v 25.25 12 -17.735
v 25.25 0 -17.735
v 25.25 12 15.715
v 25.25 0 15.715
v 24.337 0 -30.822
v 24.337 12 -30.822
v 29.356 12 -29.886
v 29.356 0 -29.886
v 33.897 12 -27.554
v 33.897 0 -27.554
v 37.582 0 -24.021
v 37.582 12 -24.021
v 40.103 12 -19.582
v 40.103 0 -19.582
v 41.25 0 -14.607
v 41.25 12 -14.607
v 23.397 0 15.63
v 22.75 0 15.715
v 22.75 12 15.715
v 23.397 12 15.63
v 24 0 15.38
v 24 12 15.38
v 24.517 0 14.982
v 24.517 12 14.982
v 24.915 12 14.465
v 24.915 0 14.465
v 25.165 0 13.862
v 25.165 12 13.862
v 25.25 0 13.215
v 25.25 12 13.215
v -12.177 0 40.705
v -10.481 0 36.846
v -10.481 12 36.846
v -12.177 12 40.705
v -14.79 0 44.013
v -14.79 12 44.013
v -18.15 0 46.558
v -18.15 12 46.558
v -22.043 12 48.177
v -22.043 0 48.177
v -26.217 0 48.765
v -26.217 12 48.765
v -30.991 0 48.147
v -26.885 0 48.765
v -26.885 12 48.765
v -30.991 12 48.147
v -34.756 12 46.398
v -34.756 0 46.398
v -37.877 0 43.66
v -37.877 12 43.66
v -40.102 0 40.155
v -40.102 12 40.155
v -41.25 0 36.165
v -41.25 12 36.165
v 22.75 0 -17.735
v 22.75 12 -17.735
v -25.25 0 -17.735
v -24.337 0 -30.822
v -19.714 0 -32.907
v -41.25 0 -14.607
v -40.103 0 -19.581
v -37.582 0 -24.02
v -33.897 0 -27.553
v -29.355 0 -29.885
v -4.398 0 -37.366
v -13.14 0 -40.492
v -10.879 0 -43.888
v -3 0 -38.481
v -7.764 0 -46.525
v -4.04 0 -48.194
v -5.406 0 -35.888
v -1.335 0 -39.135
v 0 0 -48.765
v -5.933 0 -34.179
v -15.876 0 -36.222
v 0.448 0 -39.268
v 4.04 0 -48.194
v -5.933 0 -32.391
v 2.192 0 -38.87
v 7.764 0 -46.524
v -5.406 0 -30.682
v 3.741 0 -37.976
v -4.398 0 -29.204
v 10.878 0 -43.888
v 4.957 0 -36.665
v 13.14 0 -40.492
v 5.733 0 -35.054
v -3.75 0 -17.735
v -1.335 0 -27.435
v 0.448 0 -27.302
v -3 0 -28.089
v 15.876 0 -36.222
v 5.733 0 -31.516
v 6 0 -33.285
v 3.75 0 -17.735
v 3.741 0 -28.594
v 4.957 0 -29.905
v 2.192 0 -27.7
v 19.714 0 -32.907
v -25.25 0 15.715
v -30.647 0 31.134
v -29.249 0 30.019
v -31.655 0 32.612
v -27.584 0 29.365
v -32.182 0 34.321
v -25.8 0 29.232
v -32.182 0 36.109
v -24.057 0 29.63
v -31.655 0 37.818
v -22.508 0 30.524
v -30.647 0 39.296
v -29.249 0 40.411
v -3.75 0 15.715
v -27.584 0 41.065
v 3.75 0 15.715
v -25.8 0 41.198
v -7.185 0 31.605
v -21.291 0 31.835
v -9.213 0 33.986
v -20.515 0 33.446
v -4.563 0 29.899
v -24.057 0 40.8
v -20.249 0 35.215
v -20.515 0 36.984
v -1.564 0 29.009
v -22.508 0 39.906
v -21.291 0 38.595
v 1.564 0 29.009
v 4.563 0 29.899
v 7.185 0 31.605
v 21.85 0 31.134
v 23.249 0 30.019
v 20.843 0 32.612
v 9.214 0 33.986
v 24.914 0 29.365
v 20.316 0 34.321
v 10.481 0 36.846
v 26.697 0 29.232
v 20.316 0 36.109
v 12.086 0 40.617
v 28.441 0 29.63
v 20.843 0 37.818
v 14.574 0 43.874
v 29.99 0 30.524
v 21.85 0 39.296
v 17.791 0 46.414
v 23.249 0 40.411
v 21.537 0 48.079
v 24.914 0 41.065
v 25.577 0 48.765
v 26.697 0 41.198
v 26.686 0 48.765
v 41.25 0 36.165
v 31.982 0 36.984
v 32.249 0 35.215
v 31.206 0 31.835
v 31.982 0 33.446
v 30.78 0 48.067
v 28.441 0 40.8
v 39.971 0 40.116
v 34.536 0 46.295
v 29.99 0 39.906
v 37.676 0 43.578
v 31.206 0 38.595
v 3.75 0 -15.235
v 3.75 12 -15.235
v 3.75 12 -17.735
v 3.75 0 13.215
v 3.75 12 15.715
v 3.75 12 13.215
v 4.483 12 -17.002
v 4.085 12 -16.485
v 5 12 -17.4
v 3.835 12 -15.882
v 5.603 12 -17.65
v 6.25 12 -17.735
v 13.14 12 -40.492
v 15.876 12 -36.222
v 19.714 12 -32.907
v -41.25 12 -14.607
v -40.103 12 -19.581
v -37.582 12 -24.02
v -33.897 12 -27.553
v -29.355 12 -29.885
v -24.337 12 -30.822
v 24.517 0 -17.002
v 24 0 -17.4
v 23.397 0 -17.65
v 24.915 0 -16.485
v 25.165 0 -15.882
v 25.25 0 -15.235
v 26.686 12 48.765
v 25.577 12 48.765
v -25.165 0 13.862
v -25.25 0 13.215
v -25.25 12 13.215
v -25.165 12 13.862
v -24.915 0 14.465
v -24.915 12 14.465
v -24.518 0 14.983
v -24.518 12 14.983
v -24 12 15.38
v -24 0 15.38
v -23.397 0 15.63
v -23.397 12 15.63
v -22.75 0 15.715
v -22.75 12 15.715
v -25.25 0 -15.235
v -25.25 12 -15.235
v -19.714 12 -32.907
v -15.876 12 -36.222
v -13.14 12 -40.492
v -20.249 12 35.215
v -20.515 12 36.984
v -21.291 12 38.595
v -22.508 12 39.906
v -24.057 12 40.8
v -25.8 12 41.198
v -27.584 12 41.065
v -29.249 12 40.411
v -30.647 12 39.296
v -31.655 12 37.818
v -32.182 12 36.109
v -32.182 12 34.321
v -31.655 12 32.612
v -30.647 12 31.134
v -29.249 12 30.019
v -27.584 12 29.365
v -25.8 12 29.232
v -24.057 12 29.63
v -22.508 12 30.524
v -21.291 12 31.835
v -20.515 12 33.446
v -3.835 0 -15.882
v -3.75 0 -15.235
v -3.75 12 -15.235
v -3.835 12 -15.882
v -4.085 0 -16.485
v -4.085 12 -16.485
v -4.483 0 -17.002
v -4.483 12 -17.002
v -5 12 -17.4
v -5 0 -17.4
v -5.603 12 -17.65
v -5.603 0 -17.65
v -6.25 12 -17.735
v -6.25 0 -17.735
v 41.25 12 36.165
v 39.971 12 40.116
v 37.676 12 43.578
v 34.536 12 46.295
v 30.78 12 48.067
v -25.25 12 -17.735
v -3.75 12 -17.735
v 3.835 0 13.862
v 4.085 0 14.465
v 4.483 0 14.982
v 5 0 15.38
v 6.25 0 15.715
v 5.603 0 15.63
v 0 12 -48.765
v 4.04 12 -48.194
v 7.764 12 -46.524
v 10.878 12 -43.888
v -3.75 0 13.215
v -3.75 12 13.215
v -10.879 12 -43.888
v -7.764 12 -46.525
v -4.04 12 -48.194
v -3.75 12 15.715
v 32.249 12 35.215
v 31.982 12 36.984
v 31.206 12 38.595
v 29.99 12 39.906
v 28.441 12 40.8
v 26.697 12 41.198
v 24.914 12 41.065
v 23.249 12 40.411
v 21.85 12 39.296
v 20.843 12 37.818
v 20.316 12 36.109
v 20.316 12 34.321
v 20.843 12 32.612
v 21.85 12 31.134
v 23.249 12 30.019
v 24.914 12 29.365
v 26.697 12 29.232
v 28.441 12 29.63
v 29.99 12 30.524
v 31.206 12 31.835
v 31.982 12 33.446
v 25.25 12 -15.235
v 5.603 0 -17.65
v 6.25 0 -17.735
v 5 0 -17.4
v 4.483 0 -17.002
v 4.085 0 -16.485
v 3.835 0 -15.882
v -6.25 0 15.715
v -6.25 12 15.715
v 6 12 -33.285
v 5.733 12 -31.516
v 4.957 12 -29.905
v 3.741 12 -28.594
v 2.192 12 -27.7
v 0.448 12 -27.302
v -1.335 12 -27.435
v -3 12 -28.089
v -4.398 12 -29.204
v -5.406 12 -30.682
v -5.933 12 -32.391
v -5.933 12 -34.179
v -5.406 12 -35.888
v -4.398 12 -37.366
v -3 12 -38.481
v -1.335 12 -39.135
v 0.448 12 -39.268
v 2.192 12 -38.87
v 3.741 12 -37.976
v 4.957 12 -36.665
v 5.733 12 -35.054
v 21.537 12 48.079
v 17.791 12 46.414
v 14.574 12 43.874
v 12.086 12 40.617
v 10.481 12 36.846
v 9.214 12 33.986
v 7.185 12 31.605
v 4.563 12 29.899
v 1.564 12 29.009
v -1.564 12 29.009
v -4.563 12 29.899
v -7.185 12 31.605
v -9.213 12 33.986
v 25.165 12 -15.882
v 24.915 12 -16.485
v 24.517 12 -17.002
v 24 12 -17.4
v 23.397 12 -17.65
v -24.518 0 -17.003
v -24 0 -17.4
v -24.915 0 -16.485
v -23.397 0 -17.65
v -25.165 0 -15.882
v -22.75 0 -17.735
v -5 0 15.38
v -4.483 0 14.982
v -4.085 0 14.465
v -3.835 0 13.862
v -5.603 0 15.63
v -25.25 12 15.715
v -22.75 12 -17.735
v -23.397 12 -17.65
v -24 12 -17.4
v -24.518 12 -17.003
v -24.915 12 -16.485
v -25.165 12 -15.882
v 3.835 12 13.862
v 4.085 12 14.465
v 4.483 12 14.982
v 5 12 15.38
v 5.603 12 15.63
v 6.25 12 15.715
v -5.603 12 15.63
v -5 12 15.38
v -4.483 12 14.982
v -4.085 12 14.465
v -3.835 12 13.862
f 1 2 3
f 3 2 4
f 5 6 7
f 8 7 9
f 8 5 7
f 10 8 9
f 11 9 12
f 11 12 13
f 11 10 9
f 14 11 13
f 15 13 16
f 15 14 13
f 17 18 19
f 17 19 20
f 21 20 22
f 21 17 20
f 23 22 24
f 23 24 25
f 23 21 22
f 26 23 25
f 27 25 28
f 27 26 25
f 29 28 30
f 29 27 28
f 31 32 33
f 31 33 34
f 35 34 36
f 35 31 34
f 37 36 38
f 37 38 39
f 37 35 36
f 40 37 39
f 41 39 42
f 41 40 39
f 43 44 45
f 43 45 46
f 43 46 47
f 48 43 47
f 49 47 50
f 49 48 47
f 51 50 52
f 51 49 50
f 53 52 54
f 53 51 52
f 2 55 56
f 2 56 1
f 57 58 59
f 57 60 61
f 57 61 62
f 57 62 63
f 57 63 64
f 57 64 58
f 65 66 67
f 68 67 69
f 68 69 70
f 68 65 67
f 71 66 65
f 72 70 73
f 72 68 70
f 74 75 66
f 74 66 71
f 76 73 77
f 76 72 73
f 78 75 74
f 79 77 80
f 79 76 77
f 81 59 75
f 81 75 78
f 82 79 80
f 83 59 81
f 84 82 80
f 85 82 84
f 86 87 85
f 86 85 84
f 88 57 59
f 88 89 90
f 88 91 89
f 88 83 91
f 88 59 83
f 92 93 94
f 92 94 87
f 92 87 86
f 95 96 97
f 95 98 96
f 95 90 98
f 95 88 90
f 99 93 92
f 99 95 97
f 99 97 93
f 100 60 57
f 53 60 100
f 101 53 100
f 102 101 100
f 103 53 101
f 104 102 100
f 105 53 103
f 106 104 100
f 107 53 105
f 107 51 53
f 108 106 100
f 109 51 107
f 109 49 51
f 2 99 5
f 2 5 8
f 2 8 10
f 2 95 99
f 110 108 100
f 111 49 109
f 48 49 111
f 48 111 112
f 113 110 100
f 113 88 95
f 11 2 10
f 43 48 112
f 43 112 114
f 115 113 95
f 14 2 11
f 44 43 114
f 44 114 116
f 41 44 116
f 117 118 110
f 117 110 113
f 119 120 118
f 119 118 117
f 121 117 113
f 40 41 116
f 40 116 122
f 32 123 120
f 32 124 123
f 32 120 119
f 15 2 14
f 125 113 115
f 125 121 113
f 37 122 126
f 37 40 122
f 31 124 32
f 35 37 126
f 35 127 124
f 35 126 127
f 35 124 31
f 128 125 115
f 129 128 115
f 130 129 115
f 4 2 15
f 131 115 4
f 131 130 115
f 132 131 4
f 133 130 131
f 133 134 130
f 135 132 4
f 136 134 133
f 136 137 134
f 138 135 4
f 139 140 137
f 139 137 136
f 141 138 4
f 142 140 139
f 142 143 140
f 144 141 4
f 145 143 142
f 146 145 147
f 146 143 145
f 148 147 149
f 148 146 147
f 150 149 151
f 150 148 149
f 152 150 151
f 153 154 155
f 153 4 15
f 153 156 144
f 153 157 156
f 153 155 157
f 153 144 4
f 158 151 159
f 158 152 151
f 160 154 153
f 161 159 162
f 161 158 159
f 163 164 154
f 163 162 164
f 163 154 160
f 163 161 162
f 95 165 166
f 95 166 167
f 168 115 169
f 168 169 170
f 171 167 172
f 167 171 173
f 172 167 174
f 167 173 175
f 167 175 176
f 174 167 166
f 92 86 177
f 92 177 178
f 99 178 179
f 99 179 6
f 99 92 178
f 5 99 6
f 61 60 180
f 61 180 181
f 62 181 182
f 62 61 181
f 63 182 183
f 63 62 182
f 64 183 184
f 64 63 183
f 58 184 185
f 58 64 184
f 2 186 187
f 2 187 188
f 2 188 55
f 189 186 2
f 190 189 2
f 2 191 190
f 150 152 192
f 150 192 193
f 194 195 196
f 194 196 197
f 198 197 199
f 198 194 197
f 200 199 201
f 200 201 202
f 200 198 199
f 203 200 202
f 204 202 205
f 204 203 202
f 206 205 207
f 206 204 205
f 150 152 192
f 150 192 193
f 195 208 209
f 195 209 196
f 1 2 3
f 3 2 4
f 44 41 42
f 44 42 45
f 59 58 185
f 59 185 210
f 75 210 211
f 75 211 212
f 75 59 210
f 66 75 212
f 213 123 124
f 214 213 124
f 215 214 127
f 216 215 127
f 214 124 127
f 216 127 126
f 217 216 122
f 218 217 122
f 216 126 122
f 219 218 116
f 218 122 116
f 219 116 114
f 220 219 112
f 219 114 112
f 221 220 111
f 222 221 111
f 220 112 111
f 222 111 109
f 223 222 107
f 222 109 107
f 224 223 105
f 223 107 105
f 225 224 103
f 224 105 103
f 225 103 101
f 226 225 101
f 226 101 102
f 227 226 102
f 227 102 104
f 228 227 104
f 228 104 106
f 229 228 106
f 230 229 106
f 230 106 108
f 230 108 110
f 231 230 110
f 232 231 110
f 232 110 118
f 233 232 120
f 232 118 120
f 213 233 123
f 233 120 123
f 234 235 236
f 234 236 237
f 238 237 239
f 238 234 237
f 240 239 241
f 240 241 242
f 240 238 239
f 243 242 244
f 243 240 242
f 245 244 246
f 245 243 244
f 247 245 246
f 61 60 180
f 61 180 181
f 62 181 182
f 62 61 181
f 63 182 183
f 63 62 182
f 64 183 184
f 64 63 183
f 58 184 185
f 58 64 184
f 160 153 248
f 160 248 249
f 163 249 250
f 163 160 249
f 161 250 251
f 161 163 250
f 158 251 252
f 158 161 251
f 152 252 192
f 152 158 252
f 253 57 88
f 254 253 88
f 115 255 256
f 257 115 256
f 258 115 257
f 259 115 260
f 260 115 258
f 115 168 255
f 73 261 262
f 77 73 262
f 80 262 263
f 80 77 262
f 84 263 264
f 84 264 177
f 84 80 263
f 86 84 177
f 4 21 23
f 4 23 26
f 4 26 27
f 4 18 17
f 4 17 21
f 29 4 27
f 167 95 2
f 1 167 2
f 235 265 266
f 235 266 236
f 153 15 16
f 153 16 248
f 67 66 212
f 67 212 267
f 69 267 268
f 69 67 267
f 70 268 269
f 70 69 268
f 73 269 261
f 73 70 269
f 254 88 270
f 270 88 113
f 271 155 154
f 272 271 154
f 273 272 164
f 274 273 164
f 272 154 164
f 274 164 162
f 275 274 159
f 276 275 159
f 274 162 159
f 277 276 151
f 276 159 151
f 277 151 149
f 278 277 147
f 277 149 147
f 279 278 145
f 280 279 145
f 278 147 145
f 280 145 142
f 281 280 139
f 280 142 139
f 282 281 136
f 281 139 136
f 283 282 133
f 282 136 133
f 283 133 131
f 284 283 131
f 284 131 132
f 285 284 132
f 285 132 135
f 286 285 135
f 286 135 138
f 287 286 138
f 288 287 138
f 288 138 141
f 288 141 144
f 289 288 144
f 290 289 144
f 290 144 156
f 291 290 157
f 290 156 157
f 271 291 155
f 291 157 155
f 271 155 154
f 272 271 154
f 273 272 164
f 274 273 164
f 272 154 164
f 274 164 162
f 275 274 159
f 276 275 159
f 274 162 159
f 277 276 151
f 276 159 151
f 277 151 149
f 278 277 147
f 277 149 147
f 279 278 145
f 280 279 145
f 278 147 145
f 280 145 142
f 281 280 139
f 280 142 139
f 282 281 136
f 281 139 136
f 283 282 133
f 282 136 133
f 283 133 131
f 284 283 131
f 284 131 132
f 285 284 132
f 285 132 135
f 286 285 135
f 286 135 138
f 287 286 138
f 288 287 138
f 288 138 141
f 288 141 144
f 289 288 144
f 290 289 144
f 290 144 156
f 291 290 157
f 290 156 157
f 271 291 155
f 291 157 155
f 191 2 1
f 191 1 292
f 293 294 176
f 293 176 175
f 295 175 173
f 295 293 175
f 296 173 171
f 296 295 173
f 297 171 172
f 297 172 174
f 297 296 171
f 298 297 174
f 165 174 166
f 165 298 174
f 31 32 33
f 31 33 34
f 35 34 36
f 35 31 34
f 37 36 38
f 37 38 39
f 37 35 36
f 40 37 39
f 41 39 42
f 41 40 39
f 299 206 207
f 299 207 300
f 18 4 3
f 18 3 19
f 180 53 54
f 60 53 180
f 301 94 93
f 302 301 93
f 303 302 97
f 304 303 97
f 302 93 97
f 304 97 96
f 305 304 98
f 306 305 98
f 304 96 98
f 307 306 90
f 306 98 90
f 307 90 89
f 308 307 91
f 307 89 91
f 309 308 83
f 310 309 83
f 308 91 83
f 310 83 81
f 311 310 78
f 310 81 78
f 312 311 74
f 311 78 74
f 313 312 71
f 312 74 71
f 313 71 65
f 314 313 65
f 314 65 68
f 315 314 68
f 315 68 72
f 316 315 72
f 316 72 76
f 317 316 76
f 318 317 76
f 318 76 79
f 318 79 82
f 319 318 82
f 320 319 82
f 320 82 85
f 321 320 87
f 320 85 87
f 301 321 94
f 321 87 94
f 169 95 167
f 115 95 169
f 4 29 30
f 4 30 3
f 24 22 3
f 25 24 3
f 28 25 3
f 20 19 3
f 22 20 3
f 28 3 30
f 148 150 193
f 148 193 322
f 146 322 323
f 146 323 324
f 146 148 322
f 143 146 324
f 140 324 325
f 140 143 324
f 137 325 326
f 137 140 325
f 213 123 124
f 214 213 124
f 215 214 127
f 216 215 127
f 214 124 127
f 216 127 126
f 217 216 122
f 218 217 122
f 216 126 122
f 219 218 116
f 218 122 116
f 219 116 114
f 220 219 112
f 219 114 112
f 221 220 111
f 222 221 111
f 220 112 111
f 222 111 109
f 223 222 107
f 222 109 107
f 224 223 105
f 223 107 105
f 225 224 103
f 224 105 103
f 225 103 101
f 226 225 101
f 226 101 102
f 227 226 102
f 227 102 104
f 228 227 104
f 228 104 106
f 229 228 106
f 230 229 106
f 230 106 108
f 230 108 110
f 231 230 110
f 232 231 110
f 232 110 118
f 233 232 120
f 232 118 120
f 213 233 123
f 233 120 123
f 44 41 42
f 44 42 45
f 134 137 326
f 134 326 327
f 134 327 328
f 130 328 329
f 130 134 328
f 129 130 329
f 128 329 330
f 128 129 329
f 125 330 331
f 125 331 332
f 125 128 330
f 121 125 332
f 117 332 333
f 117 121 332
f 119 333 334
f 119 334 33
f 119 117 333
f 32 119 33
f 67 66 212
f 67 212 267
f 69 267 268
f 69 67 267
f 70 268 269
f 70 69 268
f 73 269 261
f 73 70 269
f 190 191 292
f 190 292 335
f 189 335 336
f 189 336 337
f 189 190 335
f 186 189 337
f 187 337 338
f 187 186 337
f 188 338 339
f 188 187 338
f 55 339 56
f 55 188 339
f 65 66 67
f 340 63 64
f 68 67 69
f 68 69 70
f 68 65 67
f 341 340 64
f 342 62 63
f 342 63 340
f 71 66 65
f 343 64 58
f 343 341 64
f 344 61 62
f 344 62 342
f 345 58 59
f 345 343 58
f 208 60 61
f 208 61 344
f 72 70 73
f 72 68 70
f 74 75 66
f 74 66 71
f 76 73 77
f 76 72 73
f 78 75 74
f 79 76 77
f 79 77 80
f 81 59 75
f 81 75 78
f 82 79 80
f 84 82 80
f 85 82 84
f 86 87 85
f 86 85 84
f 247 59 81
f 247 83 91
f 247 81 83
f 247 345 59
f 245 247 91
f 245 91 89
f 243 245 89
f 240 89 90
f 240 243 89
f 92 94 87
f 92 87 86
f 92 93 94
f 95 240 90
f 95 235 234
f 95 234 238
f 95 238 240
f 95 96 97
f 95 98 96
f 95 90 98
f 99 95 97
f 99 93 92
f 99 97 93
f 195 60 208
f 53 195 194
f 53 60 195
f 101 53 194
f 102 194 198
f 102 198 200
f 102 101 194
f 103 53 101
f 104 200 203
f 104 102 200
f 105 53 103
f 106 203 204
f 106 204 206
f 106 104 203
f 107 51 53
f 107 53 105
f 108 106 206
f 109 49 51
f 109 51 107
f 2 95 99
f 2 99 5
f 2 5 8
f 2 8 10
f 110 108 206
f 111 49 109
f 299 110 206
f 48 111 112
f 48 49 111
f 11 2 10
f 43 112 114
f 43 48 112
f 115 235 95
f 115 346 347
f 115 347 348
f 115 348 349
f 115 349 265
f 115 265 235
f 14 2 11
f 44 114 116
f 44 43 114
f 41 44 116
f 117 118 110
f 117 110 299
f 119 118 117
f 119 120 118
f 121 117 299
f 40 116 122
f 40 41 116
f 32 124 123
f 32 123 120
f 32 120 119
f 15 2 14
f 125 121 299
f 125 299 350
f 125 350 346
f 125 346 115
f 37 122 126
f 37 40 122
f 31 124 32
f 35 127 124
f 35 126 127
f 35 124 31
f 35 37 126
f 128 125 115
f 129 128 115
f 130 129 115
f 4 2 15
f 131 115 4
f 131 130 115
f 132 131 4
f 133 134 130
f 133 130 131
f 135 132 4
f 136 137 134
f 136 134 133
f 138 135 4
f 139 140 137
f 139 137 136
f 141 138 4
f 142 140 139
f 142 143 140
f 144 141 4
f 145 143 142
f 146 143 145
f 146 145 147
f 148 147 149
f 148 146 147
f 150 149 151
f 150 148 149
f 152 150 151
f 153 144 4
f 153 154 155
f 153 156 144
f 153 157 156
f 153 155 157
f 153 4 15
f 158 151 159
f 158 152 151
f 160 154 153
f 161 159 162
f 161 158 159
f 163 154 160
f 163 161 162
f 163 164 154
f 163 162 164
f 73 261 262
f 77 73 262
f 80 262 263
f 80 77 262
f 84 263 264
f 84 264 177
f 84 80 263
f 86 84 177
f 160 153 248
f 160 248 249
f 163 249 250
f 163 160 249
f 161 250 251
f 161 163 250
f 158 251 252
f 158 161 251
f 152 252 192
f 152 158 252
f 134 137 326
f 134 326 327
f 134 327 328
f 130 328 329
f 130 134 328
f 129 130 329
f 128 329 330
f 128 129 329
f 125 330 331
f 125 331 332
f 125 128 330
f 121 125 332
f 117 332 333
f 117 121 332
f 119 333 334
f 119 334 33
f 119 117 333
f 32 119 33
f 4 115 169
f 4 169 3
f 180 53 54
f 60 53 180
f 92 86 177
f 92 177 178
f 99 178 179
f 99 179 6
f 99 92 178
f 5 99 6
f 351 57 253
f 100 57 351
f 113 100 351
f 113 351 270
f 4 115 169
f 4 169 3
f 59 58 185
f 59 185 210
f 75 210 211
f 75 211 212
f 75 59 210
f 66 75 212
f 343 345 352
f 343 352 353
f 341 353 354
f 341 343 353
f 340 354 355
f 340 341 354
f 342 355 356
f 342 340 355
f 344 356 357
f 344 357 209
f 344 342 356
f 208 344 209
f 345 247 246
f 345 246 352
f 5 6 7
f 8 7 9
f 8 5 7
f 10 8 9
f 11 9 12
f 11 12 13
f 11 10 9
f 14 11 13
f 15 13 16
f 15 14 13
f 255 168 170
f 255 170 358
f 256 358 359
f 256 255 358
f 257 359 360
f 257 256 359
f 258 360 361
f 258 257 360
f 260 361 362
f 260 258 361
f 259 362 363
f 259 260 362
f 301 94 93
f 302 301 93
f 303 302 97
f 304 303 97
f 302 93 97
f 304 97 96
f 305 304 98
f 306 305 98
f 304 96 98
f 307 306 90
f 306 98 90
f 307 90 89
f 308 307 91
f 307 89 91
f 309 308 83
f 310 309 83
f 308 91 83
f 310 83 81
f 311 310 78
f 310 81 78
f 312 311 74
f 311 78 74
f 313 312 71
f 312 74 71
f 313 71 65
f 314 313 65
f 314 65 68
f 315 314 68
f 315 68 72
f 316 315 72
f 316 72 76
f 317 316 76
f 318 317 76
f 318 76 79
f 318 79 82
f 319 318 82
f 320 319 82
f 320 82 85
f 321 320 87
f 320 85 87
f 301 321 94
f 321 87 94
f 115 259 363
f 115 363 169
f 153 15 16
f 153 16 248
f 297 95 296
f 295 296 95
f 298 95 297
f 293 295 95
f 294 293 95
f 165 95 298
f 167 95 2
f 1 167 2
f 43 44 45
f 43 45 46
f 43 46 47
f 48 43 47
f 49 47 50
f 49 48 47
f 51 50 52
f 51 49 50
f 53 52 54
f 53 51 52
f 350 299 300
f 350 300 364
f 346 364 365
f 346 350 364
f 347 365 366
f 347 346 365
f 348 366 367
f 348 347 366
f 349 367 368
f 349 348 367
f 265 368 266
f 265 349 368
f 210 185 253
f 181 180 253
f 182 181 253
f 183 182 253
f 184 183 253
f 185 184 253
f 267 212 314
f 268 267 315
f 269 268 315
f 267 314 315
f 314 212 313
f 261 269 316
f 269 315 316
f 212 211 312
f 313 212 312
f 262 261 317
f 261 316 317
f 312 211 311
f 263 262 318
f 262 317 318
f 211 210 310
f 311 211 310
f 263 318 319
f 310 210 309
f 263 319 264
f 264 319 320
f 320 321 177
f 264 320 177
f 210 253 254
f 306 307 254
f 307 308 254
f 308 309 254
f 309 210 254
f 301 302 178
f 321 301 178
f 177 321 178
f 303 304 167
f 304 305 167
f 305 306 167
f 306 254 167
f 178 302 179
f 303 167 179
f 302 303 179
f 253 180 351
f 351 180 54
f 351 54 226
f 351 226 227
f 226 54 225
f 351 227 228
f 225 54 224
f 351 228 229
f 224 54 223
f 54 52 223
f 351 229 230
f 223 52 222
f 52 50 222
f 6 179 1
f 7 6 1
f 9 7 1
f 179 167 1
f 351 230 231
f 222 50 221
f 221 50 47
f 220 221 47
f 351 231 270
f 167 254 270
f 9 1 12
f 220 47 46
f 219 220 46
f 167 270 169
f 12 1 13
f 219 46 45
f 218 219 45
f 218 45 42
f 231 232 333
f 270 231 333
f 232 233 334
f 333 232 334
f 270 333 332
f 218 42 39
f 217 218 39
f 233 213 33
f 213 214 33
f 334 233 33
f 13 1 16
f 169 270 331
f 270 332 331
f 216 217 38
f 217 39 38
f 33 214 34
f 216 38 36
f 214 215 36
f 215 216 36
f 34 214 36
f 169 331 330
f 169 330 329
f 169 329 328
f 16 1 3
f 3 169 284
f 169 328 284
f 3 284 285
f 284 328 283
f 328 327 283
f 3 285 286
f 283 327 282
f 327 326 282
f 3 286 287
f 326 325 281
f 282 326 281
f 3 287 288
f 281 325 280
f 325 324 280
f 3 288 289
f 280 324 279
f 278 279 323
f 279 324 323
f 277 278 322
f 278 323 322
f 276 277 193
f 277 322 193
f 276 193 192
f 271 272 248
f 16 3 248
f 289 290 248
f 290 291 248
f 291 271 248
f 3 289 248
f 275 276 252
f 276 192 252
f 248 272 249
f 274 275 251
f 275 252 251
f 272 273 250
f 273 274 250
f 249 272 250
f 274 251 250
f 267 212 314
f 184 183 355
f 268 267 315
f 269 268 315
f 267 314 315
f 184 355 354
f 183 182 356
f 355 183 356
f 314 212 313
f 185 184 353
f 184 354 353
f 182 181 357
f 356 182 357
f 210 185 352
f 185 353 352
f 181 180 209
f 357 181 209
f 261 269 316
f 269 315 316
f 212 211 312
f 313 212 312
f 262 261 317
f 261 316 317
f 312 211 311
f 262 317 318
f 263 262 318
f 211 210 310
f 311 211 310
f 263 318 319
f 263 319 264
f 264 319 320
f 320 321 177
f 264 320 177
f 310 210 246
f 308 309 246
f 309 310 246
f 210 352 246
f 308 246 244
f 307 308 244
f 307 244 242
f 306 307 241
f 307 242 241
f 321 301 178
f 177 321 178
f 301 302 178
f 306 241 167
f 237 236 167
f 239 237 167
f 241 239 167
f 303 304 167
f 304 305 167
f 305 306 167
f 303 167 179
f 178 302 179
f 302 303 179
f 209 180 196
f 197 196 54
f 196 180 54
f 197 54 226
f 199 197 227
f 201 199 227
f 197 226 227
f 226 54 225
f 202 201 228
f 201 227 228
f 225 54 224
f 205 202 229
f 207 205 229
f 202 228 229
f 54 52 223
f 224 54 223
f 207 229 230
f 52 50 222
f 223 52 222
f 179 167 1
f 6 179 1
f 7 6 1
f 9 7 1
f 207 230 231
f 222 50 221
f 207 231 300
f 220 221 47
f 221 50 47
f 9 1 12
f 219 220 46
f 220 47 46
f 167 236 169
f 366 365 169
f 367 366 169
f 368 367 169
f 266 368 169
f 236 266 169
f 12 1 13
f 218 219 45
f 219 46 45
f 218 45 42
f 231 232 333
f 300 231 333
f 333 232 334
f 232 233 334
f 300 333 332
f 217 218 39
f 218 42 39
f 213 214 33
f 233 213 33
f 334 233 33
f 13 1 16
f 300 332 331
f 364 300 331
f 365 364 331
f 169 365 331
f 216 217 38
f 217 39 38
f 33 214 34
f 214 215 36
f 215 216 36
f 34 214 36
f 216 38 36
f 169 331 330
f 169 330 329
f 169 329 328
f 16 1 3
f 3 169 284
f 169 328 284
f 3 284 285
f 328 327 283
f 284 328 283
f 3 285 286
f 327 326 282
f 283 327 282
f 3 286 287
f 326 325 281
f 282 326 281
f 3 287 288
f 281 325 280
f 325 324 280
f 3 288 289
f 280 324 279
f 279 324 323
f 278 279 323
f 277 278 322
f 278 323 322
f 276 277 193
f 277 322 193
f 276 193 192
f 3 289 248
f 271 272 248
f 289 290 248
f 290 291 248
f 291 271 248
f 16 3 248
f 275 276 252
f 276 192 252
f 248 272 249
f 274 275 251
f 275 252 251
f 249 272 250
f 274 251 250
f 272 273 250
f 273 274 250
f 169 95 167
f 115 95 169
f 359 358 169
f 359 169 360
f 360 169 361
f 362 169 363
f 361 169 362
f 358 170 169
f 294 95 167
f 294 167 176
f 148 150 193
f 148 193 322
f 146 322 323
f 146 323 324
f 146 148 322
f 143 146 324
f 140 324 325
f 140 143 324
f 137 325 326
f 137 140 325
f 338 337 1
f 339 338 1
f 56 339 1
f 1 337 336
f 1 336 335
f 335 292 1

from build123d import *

# Parameters (mm, degrees)
F6_DEPTH = 12
F4_R     = 6
F4_W     = 21.5
F4_H     = 33.45
F3_W     = 21.5
F3_H     = 33.45
F3_R     = 6


with BuildPart() as f6:
    # F5 (on face) → F6 (new body)
    with BuildSketch(Plane.XZ):
        with BuildLine():
            Line((25.25, 15.715), (22.75, 15.715))
            ThreePointArc((22.75, 15.715), (24.5174373747, 14.9824373747), (25.25, 13.215))
            Line((25.25, 13.215), (25.25, 15.715))
        make_face()
    extrude(amount=-F6_DEPTH)


with BuildPart() as f6b:
    # F5 (on face) → F6, piece 2 (new body)
    with BuildSketch(Plane.XZ):
        with BuildLine():
            ThreePointArc((3.75, 13.215), (4.4825626253, 14.9824373747), (6.25, 15.715))
            Line((6.25, 15.715), (3.75, 15.715))
            Line((3.75, 15.715), (3.75, 13.215))
        make_face()
    extrude(amount=-F6_DEPTH)


with BuildPart() as f6c:
    # F5 (on face) → F6, piece 3 (new body)
    with BuildSketch(Plane.XZ):
        with BuildLine():
            Line((25.25, -17.735), (25.25, -15.235))
            ThreePointArc((25.25, -15.235), (24.5174373747, -17.0024373747), (22.75, -17.735))
            Line((22.75, -17.735), (25.25, -17.735))
        make_face()
    extrude(amount=-F6_DEPTH)


with BuildPart() as f6d:
    # F5 (on face) → F6, piece 4 (new body)
    with BuildSketch(Plane.XZ):
        with BuildLine():
            ThreePointArc((6.25, -17.735), (4.4825626253, -17.0024373747), (3.75, -15.235))
            Line((3.75, -15.235), (3.75, -17.735))
            Line((3.75, -17.735), (6.25, -17.735))
        make_face()
    extrude(amount=-F6_DEPTH)


with BuildPart() as f6e:
    # F4 (on face) → F6, piece 5 (new body)
    with BuildSketch(Plane.XZ):
        with BuildLine():
            ThreePointArc((-41.25, -14.607), (-35.8674022278, -25.9207231501), (-24.337, -30.822))
            ThreePointArc((-24.337, -30.822), (-17.6753424514, -34.4258801724), (-13.1401661783, -40.492))
            ThreePointArc((-13.1401661783, -40.492), (-7.7638565745, -46.5245050412), (-9.43185e-05, -48.765))
            ThreePointArc((-9.43185e-05, -48.765), (7.7636899207, -46.5244912019), (13.14, -40.4919531523))
            ThreePointArc((13.14, -40.4919531523), (17.6755802004, -34.4261199153), (24.3369212747, -30.8216288686))
            ThreePointArc((24.3369212747, -30.8216288686), (35.8680052264, -25.921153722), (41.25, -14.606796205))
            Line((41.25, -14.606796205), (41.25, 36.165))
            ThreePointArc((41.25, 36.165), (36.1986202104, 45.0433137098), (26.686, 48.765))
            Line((26.686, 48.765), (25.5774514153, 48.765))
            ThreePointArc((25.5774514153, 48.765), (16.1031746077, 45.24501144), (10.481, 36.846))
            ThreePointArc((10.481, 36.846), (0.0002400088, 28.896512173), (-10.4806832969, 36.8457846785))
            ThreePointArc((-10.4806832969, 36.8457846785), (-16.3890913636, 45.3926785372), (-26.2169155617, 48.765))
            Line((-26.2169155617, 48.765), (-26.6445539892, 48.765))
            Line((-26.6445539892, 48.765), (-26.6858417388, 48.765))
            Line((-26.6858417388, 48.765), (-26.8851875879, 48.765))
            ThreePointArc((-26.8851875879, 48.765), (-36.4145684312, 45.1407024127), (-41.25, 36.165))
            Line((-41.25, 36.165), (-41.25, -14.607))
        make_face()
        Polygon((-25.25, 15.715), (-22.75, 15.715), (-6.25, 15.715), (-3.75, 15.715), (-3.75, 13.215), (-3.75, -15.235), (-3.75, -17.735), (-6.25, -17.735), (-22.75, -17.735), (-25.25, -17.735), (-25.25, -15.235), (-25.25, 13.215), align=None, mode=Mode.SUBTRACT)
        with Locations((0, -33.285)):
            Circle(F4_R, mode=Mode.SUBTRACT)
        with Locations((14.5, -1.01)):
            Rectangle(F4_W, F4_H, mode=Mode.SUBTRACT)
        with Locations((-26.2487990011, 35.215)):
            Circle(F4_R, mode=Mode.SUBTRACT)
        with Locations((26.2487990011, 35.215)):
            Circle(F4_R, mode=Mode.SUBTRACT)
        with BuildLine():
            Line((-3.75, -17.735), (-3.75, -15.235))
            ThreePointArc((-3.75, -15.235), (-4.4825626253, -17.0024373747), (-6.25, -17.735))
            Line((-6.25, -17.735), (-3.75, -17.735))
        make_face()
        with BuildLine():
            Line((-3.75, 15.715), (-6.25, 15.715))
            ThreePointArc((-6.25, 15.715), (-4.4825626253, 14.9824373747), (-3.75, 13.215))
            Line((-3.75, 13.215), (-3.75, 15.715))
        make_face()
        with BuildLine():
            ThreePointArc((-25.25, 13.215), (-24.517766953, 14.982766953), (-22.75, 15.715))
            Line((-22.75, 15.715), (-25.25, 15.715))
            Line((-25.25, 15.715), (-25.25, 13.215))
        make_face()
        with BuildLine():
            ThreePointArc((-22.75, -17.735), (-24.517766953, -17.002766953), (-25.25, -15.235))
            Line((-25.25, -15.235), (-25.25, -17.735))
            Line((-25.25, -17.735), (-22.75, -17.735))
        make_face()
    extrude(amount=-F6_DEPTH)


with BuildPart() as f6f:
    # F3 (on face) → F6, piece 6 (new body)
    with BuildSketch(Plane.XZ):
        with BuildLine():
            ThreePointArc((-24.337, -30.822), (-17.6753424514, -34.4258801724), (-13.1401661783, -40.492))
            ThreePointArc((-13.1401661783, -40.492), (-7.7638565745, -46.5245050412), (-9.43185e-05, -48.765))
            ThreePointArc((-9.43185e-05, -48.765), (7.7636899207, -46.5244912019), (13.14, -40.4919531523))
            ThreePointArc((13.14, -40.4919531523), (17.6755802004, -34.4261199153), (24.3369212747, -30.8216288686))
            ThreePointArc((24.3369212747, -30.8216288686), (35.8680052264, -25.921153722), (41.25, -14.606796205))
            Line((41.25, -14.606796205), (41.25, 36.165))
            ThreePointArc((41.25, 36.165), (36.1986202104, 45.0433137098), (26.686, 48.765))
            Line((26.686, 48.765), (25.5774514153, 48.765))
            ThreePointArc((25.5774514153, 48.765), (16.1031746077, 45.24501144), (10.481, 36.846))
            ThreePointArc((10.481, 36.846), (0.0002400088, 28.896512173), (-10.4806832969, 36.8457846785))
            ThreePointArc((-10.4806832969, 36.8457846785), (-16.3890913636, 45.3926785372), (-26.2169155617, 48.765))
            Line((-26.2169155617, 48.765), (-26.6445539892, 48.765))
            Line((-26.6445539892, 48.765), (-26.6858417388, 48.765))
            Line((-26.6858417388, 48.765), (-26.8851875879, 48.765))
            ThreePointArc((-26.8851875879, 48.765), (-36.4145684312, 45.1407024127), (-41.25, 36.165))
            Line((-41.25, 36.165), (-41.25, -14.607))
            ThreePointArc((-41.25, -14.607), (-35.8674022278, -25.9207231501), (-24.337, -30.822))
        make_face()
        with Locations((-14.5, -1.01)):
            Rectangle(F3_W, F3_H, mode=Mode.SUBTRACT)
        with Locations((0, -33.285)):
            Circle(F3_R, mode=Mode.SUBTRACT)
        with Locations((14.5, -1.01)):
            Rectangle(F3_W, F3_H, mode=Mode.SUBTRACT)
        with Locations((-26.2487990011, 35.215)):
            Circle(F3_R, mode=Mode.SUBTRACT)
        with Locations((26.2487990011, 35.215)):
            Circle(F3_R, mode=Mode.SUBTRACT)
    extrude(amount=-F6_DEPTH)


solid = Compound([f6.part, f6b.part, f6c.part, f6d.part, f6e.part, f6f.part])
